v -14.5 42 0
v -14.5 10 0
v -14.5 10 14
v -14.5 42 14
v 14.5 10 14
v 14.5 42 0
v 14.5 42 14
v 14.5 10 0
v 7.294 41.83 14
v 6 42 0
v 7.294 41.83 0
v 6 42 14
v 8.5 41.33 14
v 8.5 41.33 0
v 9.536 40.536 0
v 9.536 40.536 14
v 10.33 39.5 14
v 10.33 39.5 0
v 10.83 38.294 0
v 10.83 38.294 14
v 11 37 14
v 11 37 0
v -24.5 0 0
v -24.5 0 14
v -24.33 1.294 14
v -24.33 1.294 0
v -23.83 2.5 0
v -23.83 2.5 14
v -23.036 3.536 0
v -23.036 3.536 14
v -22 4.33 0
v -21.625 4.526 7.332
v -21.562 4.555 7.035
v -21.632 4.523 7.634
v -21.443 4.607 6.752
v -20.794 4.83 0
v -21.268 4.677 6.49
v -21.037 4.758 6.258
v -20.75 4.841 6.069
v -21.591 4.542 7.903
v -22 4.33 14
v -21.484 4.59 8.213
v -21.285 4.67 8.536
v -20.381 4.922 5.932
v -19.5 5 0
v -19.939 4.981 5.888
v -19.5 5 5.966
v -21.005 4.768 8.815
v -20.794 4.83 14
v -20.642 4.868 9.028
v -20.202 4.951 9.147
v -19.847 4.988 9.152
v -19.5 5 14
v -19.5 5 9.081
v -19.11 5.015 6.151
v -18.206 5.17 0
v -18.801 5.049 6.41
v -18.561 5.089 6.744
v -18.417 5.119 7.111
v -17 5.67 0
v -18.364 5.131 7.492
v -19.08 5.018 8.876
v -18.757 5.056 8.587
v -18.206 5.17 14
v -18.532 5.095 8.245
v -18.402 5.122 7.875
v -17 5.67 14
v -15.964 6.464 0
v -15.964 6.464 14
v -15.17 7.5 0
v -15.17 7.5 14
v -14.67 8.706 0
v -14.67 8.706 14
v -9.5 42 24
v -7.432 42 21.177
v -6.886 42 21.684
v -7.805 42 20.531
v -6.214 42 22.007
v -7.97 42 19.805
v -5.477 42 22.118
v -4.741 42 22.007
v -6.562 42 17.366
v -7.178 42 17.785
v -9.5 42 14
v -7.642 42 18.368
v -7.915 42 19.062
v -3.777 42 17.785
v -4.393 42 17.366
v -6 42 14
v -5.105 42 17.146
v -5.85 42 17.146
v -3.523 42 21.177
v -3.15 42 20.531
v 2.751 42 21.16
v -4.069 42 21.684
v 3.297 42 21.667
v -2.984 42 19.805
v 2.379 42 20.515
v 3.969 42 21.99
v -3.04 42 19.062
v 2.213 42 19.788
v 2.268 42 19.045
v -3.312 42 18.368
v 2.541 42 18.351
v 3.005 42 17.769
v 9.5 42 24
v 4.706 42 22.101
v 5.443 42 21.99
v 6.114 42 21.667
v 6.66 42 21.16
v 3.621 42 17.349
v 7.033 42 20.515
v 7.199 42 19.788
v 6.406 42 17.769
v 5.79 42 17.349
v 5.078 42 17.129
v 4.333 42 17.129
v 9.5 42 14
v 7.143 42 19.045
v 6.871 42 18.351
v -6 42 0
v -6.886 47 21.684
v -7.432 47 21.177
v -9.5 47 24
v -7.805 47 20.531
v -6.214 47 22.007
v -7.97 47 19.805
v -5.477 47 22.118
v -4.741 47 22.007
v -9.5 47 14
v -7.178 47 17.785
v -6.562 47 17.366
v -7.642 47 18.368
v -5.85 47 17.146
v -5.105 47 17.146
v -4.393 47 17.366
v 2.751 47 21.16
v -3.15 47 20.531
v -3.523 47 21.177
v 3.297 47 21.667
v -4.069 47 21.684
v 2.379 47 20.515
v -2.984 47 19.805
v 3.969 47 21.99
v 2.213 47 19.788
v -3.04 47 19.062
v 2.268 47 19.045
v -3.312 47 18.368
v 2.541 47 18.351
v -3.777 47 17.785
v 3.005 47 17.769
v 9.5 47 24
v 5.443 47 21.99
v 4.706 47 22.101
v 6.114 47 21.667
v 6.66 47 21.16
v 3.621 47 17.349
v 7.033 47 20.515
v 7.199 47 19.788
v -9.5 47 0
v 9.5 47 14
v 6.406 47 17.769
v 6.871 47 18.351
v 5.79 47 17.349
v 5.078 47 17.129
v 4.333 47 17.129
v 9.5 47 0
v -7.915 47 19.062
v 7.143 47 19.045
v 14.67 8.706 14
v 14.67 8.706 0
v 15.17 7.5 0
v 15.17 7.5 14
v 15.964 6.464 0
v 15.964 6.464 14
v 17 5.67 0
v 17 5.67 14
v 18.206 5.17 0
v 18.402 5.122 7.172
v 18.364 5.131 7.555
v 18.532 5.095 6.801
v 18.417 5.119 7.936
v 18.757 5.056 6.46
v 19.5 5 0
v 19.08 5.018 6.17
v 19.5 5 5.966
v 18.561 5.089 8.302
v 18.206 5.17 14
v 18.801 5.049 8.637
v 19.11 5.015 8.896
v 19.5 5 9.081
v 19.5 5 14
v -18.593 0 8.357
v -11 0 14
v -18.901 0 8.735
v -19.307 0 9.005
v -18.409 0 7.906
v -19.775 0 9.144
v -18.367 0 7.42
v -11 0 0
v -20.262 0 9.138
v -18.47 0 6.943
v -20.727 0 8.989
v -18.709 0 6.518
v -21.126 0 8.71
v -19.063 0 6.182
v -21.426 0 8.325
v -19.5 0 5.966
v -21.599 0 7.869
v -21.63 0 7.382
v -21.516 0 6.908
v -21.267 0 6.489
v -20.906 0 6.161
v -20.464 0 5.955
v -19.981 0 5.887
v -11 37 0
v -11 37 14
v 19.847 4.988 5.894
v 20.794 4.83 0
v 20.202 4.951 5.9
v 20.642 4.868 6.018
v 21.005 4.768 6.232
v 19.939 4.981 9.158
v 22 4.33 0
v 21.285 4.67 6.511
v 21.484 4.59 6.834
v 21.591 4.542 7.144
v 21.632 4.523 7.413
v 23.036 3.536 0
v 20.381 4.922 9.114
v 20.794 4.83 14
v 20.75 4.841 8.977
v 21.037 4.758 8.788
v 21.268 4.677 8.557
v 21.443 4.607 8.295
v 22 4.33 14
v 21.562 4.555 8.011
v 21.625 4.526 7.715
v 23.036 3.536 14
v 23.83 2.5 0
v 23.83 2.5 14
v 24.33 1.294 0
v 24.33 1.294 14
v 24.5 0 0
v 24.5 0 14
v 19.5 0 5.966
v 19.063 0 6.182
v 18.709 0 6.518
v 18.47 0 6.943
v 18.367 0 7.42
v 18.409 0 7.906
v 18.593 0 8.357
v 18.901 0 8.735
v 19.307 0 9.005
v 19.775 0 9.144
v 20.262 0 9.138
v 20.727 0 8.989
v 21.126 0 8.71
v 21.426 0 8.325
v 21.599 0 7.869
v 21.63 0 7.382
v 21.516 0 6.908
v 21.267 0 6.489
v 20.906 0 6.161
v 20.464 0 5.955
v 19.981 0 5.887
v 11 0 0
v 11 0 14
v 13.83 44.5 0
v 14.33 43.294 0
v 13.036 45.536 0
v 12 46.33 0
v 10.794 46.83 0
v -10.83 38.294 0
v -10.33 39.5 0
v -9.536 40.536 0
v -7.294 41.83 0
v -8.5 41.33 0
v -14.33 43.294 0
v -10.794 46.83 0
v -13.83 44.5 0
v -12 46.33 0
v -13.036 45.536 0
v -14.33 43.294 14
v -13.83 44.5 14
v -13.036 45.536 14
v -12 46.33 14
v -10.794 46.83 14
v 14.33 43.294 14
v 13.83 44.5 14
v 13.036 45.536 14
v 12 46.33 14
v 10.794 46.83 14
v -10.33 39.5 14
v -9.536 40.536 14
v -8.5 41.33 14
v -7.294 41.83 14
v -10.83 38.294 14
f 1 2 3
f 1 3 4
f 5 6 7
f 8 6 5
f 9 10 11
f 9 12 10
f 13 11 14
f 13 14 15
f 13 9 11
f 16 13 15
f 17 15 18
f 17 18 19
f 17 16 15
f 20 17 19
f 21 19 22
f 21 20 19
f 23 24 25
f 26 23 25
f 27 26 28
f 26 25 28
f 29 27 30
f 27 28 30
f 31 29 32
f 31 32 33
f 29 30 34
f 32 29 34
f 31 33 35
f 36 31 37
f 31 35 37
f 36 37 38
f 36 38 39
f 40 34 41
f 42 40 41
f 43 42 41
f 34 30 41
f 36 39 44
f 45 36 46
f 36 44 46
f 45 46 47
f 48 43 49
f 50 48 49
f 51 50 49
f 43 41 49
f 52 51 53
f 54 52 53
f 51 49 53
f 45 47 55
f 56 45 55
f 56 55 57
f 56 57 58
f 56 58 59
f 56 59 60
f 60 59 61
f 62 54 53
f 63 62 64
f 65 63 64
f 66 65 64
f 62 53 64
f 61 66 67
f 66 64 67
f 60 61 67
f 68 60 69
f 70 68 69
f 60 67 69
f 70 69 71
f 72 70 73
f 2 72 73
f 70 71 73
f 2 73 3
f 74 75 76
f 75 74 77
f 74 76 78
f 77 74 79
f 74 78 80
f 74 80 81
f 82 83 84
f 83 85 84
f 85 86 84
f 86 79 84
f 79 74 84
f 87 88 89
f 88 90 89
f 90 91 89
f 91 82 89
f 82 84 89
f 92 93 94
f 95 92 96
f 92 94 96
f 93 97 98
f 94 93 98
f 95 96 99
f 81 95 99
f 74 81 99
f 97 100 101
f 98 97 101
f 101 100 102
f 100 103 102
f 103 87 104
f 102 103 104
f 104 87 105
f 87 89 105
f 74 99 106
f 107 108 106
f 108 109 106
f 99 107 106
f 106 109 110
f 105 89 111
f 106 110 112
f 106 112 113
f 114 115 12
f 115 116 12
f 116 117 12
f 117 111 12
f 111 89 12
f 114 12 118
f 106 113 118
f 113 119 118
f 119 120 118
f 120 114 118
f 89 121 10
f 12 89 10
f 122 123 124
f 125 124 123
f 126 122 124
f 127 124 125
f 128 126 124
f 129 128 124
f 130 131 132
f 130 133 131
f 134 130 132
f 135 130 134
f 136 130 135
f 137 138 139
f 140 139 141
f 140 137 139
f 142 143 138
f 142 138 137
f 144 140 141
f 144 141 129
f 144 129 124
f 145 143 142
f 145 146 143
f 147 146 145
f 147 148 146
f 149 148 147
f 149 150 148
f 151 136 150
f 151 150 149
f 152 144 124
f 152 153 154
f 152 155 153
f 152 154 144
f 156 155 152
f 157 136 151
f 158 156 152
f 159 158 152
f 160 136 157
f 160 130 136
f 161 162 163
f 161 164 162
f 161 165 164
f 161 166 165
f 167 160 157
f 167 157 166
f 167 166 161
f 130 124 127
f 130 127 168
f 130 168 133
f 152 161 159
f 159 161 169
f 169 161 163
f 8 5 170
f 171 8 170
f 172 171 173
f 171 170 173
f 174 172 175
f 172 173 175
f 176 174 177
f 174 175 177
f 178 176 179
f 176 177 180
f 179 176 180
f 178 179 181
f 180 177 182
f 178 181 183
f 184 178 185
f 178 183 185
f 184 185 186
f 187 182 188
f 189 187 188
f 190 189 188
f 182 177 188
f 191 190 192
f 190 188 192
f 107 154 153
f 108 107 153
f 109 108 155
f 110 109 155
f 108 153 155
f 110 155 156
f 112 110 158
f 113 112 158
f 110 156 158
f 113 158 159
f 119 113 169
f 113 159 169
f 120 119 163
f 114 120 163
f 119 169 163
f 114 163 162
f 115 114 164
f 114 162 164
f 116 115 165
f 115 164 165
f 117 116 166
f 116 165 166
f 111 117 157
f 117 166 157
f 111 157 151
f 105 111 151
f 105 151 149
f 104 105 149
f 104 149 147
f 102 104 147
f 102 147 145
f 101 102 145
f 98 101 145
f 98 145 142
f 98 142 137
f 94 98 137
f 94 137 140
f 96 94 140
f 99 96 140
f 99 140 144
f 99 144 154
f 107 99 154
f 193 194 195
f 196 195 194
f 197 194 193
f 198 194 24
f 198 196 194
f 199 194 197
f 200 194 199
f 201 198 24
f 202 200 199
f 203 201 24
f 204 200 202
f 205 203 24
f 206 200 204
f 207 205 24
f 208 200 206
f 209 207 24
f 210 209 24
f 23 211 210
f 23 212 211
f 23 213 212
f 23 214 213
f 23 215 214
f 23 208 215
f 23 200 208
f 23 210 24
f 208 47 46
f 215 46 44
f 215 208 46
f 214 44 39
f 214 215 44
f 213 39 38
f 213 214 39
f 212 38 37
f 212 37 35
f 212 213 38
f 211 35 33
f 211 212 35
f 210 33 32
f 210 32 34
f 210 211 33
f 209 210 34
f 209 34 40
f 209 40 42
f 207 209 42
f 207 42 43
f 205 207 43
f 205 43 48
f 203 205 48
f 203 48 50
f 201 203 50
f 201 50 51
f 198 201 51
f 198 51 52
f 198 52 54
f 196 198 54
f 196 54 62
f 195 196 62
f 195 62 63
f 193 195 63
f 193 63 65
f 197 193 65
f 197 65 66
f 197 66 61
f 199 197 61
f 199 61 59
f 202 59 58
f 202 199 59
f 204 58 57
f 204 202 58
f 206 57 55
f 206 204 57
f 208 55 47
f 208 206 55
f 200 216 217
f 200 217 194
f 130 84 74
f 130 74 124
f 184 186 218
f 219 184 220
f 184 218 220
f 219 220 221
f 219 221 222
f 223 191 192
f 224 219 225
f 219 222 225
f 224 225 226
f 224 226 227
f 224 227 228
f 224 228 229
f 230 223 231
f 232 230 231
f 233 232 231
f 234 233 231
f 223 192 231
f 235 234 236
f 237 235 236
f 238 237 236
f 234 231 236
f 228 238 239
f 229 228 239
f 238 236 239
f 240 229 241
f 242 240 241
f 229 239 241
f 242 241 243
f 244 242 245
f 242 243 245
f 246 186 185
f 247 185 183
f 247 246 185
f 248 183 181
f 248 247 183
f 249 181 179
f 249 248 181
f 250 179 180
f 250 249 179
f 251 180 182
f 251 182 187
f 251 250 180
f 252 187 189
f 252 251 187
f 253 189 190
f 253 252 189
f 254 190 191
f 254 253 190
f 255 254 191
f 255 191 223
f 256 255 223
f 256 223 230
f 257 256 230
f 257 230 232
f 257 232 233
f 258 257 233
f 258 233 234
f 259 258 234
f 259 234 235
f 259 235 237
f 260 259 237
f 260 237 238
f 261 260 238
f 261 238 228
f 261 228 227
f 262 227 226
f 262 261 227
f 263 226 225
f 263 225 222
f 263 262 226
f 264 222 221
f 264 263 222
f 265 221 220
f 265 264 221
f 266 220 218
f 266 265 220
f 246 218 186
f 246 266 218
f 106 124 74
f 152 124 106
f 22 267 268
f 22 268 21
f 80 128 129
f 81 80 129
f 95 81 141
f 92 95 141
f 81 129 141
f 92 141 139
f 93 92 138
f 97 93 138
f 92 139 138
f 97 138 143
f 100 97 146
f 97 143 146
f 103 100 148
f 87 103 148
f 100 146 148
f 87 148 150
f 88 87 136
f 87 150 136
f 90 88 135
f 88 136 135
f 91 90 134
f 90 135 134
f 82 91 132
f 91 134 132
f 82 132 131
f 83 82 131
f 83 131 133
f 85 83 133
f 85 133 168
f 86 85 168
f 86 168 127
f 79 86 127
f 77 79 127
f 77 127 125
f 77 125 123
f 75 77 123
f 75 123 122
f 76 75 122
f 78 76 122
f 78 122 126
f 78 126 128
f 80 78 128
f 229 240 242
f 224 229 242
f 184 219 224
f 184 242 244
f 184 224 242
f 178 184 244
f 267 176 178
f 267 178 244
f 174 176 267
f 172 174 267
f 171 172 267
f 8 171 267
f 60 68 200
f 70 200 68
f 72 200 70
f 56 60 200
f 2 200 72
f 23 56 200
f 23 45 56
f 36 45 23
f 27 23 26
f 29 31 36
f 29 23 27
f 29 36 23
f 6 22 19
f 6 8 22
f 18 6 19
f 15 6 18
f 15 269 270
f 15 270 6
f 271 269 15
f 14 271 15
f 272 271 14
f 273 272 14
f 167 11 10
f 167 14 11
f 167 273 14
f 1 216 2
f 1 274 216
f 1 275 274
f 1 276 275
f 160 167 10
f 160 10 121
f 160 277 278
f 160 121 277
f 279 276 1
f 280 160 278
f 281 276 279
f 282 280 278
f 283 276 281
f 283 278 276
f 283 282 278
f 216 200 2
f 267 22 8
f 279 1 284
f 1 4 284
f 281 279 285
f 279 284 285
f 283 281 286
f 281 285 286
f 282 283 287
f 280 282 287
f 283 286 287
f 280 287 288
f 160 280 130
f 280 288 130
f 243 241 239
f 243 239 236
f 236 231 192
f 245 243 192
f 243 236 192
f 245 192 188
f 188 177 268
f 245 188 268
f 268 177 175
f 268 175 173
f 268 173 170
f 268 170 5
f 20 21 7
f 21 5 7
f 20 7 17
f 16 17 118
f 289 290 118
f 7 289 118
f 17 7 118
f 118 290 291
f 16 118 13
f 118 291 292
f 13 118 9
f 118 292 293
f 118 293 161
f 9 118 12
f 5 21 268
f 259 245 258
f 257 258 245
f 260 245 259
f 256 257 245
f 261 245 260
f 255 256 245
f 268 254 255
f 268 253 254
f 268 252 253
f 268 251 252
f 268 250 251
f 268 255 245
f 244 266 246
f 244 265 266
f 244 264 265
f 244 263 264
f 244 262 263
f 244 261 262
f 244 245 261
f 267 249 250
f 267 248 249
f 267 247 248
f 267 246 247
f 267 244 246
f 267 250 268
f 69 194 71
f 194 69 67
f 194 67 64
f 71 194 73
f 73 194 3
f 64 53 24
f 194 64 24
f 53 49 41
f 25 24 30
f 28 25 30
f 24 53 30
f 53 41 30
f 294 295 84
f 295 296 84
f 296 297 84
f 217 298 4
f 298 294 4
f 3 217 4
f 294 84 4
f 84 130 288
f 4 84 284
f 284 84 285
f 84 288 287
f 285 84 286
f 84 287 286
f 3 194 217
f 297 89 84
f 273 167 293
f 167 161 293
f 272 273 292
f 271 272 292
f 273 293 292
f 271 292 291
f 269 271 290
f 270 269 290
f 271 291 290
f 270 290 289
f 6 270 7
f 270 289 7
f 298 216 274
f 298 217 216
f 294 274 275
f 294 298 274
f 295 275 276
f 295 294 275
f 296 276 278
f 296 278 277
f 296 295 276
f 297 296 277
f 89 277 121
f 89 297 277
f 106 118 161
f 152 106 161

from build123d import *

# Parameters (mm, degrees)
BOSS_EXTRUDE1_DEPTH     = 14
FILLET1_R               = 5
FILLET2_R               = 5
CUT_EXTRUDE3_DEPTH      = 10
CUT_EXTRUDE3_DEPTH_BACK = 10
SKETCH2_R               = 1.636049027
SKETCH4_W               = 19
SKETCH4_H               = 5
BOSS_EXTRUDE2_DEPTH     = 10
SKETCH5_R               = 2.5
CUT_EXTRUDE4_DEPTH      = 10


with BuildPart() as part:
    # Sketch1 → Boss-Extrude1 (new body)
    with BuildSketch(Plane.XY):
        Polygon((-24.5, 0), (-24.5, 5), (-14.5, 5), (-14.5, 47), (14.5, 47), (14.5, 5), (24.5, 5), (24.5, 0), (11, 0), (11, 42), (-11, 42), (-11, 0), align=None)
    extrude(amount=BOSS_EXTRUDE1_DEPTH)

    # Fillet1
    fillet1_edges = [part.edges().sort_by_distance(p)[0] for p in [
        (-14.5, 47, 7),
        (14.5, 47, 7),
        (24.5, 5, 7),
        (-24.5, 5, 7),
        (14.5, 5, 7),
        (-14.5, 5, 7),
    ]]
    fillet(fillet1_edges, radius=FILLET1_R - 0.0001)  # a hair under: the kernel refuses the full size

    # Fillet2
    fillet2_edges = [part.edges().sort_by_distance(p)[0] for p in [
        (11, 42, 7),
        (-11, 42, 7),
    ]]
    fillet(fillet2_edges, radius=FILLET2_R)

    # Sketch2 → Cut-Extrude3 (cut, two sides: drawn at the far end of the back side and taken through both)
    with BuildSketch(Plane(origin=(0, 0, 0), x_dir=(1, 0, 0), z_dir=(0, 1, 0)).offset(-CUT_EXTRUDE3_DEPTH_BACK)):
        with Locations(Location((-20, -7.523321805, 0), (0, 0, 72.20487372))):
            Circle(SKETCH2_R)
        with Locations(Location((20, -7.523321805, 0), (0, 0, 107.795126278))):
            Circle(SKETCH2_R)
    extrude(amount=CUT_EXTRUDE3_DEPTH + CUT_EXTRUDE3_DEPTH_BACK, mode=Mode.SUBTRACT)

    # Sketch4 → Boss-Extrude2 (add)
    with BuildSketch(Plane.XY.offset(14)):
        with Locations((0, 44.5)):
            Rectangle(SKETCH4_W, SKETCH4_H)
    extrude(amount=BOSS_EXTRUDE2_DEPTH)

    # Sketch5 → Cut-Extrude4 (cut)
    with BuildSketch(Plane(origin=(0, 47, 0), x_dir=(1, 0, 0), z_dir=(0, 1, 0))):
        with Locations(Location((4.70575, -19.60149527, 0), (0, 0, 270))):
            Circle(SKETCH5_R)
        with Locations(Location((-5.477408827, -19.618067384, 0), (0, 0, 270))):
            Circle(SKETCH5_R)
    extrude(amount=-CUT_EXTRUDE4_DEPTH, mode=Mode.SUBTRACT)


solid = part.part
